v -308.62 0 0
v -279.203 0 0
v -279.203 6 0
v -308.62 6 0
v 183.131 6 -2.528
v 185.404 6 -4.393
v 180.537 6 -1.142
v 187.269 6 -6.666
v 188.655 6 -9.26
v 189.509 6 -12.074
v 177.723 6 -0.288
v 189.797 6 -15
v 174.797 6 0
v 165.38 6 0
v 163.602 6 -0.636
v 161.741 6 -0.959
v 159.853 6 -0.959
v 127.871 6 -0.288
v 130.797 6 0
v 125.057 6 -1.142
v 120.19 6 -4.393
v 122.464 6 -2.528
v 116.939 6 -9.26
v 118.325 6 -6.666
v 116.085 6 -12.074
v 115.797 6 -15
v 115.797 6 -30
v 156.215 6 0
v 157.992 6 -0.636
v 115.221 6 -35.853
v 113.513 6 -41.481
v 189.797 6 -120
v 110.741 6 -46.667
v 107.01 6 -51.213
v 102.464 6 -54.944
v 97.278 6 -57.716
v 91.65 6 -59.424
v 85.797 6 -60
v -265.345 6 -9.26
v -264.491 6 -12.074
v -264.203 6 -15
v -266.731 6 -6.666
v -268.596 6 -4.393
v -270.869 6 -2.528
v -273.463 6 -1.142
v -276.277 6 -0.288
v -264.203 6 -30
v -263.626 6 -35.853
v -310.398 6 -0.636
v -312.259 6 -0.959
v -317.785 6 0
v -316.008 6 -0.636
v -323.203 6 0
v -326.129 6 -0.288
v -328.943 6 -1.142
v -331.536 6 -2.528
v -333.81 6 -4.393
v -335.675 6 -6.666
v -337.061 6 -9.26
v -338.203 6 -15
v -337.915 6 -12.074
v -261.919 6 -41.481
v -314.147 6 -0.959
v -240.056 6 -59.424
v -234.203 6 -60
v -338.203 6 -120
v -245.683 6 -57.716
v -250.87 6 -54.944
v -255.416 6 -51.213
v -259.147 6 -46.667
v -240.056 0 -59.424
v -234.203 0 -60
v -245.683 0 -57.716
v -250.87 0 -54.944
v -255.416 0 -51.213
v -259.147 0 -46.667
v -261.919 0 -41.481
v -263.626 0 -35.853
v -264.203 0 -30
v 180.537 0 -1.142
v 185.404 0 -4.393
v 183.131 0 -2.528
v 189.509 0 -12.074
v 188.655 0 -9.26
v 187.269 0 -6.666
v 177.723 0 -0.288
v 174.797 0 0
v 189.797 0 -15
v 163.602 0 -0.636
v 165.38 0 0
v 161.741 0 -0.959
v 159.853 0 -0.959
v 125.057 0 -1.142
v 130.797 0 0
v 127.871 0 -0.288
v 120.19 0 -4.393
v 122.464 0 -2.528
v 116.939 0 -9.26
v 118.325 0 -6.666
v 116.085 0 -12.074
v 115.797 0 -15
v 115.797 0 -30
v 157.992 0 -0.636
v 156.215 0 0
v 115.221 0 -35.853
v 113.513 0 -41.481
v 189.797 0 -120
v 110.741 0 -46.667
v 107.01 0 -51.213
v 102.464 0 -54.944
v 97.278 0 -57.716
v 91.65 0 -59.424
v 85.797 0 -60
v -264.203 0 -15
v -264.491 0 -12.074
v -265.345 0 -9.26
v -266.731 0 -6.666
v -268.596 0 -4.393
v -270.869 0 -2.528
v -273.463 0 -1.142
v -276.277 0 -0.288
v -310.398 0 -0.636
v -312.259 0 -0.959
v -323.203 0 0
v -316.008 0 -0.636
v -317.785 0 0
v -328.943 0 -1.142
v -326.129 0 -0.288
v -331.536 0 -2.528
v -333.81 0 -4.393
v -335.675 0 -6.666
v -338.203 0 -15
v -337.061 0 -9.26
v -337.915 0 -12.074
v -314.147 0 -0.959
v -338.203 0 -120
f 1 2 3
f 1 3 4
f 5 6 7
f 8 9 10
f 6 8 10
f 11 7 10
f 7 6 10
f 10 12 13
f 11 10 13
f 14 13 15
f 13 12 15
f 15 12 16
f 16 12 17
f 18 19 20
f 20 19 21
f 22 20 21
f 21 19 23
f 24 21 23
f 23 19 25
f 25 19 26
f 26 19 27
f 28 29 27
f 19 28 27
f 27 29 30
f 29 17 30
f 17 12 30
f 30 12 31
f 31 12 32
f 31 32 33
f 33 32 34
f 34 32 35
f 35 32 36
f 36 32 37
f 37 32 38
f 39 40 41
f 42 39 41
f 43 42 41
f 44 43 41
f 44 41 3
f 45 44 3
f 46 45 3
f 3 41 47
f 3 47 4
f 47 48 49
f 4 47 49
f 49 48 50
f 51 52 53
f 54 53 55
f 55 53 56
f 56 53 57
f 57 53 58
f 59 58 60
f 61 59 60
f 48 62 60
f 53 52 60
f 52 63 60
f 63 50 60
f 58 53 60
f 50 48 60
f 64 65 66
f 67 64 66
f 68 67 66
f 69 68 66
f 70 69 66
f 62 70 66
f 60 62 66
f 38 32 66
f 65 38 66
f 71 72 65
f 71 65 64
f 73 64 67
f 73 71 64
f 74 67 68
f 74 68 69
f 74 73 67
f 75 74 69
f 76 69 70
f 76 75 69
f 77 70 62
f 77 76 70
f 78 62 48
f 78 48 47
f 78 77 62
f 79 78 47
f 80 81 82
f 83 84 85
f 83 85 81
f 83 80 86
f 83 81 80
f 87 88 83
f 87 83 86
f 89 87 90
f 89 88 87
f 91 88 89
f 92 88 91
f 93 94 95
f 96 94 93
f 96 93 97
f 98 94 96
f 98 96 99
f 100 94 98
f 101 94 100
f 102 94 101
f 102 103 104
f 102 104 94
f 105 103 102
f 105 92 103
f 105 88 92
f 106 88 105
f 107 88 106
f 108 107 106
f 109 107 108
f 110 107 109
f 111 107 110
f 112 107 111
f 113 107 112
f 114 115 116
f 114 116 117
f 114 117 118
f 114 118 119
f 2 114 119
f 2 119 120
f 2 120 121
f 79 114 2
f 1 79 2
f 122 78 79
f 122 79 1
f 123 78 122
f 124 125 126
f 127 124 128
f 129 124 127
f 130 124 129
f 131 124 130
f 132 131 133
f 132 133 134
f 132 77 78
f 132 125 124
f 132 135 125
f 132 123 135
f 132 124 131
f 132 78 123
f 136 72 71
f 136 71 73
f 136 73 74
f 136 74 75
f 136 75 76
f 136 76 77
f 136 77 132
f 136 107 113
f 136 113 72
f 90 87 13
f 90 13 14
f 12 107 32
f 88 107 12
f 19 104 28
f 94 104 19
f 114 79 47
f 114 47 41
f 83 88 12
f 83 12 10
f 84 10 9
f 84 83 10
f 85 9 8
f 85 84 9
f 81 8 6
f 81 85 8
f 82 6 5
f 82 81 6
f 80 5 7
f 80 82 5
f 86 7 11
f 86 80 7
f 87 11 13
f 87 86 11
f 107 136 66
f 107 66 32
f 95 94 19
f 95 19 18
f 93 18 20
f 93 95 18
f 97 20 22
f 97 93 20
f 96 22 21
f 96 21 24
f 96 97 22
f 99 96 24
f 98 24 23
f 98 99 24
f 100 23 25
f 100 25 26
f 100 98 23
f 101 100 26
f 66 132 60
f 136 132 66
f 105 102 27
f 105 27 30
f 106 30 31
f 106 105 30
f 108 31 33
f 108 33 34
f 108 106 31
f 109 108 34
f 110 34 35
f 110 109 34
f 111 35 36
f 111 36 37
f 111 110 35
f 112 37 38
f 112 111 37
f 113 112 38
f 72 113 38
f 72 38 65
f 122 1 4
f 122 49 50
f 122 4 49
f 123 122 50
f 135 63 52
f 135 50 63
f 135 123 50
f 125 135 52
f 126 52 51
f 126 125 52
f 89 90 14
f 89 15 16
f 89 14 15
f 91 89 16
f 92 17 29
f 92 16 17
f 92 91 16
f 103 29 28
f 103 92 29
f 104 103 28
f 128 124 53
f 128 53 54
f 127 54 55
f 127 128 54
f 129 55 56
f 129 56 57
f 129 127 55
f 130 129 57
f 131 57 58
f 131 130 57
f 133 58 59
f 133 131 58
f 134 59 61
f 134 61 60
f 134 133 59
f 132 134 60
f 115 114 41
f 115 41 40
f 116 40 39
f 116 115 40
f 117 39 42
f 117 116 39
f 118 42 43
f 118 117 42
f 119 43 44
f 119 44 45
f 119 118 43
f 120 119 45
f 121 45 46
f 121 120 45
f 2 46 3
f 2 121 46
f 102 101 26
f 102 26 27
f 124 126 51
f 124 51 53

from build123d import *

# Parameters (mm, degrees)
EXTRUDE_1_DEPTH          = 6
CUT_EXTRUDE_1_DEPTH      = 14
CUT_EXTRUDE_1_DEPTH_BACK = 5
SKETCH_7_R               = 11
CUT_EXTRUDE_2_DEPTH      = 11
CUT_EXTRUDE_2_DEPTH_BACK = 5
SKETCH_8_R               = 11


with BuildPart() as part:
    # Эскиз1 → Бобышка-Вытянуть1 (new body)
    with BuildSketch(Plane(origin=(0, 0, 0), x_dir=(1, 0, 0), z_dir=(0, 1, 0))):
        with BuildLine():
            Line((-338.202898551, 15), (-338.202898551, 120))
            Line((-338.202898551, 120), (189.797101449, 120))
            Line((189.797101449, 120), (189.797101449, 15))
            ThreePointArc((189.797101449, 15), (185.403703167, 4.393398282), (174.797101449, 0))
            Line((174.797101449, 0), (130.797101449, 0))
            ThreePointArc((130.797101449, 0), (120.190499731, 4.393398282), (115.797101449, 15))
            Line((115.797101449, 15), (115.797101449, 30))
            ThreePointArc((115.797101449, 30), (107.010304885, 51.213203436), (85.797101449, 60))
            Line((85.797101449, 60), (-234.202898551, 60))
            ThreePointArc((-234.202898551, 60), (-255.416101986, 51.213203436), (-264.202898551, 30))
            Line((-264.202898551, 30), (-264.202898551, 15))
            ThreePointArc((-264.202898551, 15), (-268.596296833, 4.393398282), (-279.202898551, 0))
            Line((-279.202898551, 0), (-323.202898551, 0))
            ThreePointArc((-323.202898551, 0), (-333.809500269, 4.393398282), (-338.202898551, 15))
        make_face()
    extrude(amount=EXTRUDE_1_DEPTH)

    # Эскиз7 → Вырез-Вытянуть1 (cut, two sides: drawn at the far end of the back side and taken through both)
    with BuildSketch(Plane(origin=(0, 0, 0), x_dir=(1, 0, 0), z_dir=(0, 1, 0)).offset(-CUT_EXTRUDE_1_DEPTH_BACK)):
        with Locations((-313.202898551, -10)):
            Circle(SKETCH_7_R)
    extrude(amount=CUT_EXTRUDE_1_DEPTH + CUT_EXTRUDE_1_DEPTH_BACK, mode=Mode.SUBTRACT)

    # Эскиз8 → Вырез-Вытянуть2 (cut, two sides: drawn at the far end of the back side and taken through both)
    with BuildSketch(Plane(origin=(0, 0, 0), x_dir=(1, 0, 0), z_dir=(0, 1, 0)).offset(-CUT_EXTRUDE_2_DEPTH_BACK)):
        with Locations((160.797101449, -10)):
            Circle(SKETCH_8_R)
    extrude(amount=CUT_EXTRUDE_2_DEPTH + CUT_EXTRUDE_2_DEPTH_BACK, mode=Mode.SUBTRACT)


solid = part.part
